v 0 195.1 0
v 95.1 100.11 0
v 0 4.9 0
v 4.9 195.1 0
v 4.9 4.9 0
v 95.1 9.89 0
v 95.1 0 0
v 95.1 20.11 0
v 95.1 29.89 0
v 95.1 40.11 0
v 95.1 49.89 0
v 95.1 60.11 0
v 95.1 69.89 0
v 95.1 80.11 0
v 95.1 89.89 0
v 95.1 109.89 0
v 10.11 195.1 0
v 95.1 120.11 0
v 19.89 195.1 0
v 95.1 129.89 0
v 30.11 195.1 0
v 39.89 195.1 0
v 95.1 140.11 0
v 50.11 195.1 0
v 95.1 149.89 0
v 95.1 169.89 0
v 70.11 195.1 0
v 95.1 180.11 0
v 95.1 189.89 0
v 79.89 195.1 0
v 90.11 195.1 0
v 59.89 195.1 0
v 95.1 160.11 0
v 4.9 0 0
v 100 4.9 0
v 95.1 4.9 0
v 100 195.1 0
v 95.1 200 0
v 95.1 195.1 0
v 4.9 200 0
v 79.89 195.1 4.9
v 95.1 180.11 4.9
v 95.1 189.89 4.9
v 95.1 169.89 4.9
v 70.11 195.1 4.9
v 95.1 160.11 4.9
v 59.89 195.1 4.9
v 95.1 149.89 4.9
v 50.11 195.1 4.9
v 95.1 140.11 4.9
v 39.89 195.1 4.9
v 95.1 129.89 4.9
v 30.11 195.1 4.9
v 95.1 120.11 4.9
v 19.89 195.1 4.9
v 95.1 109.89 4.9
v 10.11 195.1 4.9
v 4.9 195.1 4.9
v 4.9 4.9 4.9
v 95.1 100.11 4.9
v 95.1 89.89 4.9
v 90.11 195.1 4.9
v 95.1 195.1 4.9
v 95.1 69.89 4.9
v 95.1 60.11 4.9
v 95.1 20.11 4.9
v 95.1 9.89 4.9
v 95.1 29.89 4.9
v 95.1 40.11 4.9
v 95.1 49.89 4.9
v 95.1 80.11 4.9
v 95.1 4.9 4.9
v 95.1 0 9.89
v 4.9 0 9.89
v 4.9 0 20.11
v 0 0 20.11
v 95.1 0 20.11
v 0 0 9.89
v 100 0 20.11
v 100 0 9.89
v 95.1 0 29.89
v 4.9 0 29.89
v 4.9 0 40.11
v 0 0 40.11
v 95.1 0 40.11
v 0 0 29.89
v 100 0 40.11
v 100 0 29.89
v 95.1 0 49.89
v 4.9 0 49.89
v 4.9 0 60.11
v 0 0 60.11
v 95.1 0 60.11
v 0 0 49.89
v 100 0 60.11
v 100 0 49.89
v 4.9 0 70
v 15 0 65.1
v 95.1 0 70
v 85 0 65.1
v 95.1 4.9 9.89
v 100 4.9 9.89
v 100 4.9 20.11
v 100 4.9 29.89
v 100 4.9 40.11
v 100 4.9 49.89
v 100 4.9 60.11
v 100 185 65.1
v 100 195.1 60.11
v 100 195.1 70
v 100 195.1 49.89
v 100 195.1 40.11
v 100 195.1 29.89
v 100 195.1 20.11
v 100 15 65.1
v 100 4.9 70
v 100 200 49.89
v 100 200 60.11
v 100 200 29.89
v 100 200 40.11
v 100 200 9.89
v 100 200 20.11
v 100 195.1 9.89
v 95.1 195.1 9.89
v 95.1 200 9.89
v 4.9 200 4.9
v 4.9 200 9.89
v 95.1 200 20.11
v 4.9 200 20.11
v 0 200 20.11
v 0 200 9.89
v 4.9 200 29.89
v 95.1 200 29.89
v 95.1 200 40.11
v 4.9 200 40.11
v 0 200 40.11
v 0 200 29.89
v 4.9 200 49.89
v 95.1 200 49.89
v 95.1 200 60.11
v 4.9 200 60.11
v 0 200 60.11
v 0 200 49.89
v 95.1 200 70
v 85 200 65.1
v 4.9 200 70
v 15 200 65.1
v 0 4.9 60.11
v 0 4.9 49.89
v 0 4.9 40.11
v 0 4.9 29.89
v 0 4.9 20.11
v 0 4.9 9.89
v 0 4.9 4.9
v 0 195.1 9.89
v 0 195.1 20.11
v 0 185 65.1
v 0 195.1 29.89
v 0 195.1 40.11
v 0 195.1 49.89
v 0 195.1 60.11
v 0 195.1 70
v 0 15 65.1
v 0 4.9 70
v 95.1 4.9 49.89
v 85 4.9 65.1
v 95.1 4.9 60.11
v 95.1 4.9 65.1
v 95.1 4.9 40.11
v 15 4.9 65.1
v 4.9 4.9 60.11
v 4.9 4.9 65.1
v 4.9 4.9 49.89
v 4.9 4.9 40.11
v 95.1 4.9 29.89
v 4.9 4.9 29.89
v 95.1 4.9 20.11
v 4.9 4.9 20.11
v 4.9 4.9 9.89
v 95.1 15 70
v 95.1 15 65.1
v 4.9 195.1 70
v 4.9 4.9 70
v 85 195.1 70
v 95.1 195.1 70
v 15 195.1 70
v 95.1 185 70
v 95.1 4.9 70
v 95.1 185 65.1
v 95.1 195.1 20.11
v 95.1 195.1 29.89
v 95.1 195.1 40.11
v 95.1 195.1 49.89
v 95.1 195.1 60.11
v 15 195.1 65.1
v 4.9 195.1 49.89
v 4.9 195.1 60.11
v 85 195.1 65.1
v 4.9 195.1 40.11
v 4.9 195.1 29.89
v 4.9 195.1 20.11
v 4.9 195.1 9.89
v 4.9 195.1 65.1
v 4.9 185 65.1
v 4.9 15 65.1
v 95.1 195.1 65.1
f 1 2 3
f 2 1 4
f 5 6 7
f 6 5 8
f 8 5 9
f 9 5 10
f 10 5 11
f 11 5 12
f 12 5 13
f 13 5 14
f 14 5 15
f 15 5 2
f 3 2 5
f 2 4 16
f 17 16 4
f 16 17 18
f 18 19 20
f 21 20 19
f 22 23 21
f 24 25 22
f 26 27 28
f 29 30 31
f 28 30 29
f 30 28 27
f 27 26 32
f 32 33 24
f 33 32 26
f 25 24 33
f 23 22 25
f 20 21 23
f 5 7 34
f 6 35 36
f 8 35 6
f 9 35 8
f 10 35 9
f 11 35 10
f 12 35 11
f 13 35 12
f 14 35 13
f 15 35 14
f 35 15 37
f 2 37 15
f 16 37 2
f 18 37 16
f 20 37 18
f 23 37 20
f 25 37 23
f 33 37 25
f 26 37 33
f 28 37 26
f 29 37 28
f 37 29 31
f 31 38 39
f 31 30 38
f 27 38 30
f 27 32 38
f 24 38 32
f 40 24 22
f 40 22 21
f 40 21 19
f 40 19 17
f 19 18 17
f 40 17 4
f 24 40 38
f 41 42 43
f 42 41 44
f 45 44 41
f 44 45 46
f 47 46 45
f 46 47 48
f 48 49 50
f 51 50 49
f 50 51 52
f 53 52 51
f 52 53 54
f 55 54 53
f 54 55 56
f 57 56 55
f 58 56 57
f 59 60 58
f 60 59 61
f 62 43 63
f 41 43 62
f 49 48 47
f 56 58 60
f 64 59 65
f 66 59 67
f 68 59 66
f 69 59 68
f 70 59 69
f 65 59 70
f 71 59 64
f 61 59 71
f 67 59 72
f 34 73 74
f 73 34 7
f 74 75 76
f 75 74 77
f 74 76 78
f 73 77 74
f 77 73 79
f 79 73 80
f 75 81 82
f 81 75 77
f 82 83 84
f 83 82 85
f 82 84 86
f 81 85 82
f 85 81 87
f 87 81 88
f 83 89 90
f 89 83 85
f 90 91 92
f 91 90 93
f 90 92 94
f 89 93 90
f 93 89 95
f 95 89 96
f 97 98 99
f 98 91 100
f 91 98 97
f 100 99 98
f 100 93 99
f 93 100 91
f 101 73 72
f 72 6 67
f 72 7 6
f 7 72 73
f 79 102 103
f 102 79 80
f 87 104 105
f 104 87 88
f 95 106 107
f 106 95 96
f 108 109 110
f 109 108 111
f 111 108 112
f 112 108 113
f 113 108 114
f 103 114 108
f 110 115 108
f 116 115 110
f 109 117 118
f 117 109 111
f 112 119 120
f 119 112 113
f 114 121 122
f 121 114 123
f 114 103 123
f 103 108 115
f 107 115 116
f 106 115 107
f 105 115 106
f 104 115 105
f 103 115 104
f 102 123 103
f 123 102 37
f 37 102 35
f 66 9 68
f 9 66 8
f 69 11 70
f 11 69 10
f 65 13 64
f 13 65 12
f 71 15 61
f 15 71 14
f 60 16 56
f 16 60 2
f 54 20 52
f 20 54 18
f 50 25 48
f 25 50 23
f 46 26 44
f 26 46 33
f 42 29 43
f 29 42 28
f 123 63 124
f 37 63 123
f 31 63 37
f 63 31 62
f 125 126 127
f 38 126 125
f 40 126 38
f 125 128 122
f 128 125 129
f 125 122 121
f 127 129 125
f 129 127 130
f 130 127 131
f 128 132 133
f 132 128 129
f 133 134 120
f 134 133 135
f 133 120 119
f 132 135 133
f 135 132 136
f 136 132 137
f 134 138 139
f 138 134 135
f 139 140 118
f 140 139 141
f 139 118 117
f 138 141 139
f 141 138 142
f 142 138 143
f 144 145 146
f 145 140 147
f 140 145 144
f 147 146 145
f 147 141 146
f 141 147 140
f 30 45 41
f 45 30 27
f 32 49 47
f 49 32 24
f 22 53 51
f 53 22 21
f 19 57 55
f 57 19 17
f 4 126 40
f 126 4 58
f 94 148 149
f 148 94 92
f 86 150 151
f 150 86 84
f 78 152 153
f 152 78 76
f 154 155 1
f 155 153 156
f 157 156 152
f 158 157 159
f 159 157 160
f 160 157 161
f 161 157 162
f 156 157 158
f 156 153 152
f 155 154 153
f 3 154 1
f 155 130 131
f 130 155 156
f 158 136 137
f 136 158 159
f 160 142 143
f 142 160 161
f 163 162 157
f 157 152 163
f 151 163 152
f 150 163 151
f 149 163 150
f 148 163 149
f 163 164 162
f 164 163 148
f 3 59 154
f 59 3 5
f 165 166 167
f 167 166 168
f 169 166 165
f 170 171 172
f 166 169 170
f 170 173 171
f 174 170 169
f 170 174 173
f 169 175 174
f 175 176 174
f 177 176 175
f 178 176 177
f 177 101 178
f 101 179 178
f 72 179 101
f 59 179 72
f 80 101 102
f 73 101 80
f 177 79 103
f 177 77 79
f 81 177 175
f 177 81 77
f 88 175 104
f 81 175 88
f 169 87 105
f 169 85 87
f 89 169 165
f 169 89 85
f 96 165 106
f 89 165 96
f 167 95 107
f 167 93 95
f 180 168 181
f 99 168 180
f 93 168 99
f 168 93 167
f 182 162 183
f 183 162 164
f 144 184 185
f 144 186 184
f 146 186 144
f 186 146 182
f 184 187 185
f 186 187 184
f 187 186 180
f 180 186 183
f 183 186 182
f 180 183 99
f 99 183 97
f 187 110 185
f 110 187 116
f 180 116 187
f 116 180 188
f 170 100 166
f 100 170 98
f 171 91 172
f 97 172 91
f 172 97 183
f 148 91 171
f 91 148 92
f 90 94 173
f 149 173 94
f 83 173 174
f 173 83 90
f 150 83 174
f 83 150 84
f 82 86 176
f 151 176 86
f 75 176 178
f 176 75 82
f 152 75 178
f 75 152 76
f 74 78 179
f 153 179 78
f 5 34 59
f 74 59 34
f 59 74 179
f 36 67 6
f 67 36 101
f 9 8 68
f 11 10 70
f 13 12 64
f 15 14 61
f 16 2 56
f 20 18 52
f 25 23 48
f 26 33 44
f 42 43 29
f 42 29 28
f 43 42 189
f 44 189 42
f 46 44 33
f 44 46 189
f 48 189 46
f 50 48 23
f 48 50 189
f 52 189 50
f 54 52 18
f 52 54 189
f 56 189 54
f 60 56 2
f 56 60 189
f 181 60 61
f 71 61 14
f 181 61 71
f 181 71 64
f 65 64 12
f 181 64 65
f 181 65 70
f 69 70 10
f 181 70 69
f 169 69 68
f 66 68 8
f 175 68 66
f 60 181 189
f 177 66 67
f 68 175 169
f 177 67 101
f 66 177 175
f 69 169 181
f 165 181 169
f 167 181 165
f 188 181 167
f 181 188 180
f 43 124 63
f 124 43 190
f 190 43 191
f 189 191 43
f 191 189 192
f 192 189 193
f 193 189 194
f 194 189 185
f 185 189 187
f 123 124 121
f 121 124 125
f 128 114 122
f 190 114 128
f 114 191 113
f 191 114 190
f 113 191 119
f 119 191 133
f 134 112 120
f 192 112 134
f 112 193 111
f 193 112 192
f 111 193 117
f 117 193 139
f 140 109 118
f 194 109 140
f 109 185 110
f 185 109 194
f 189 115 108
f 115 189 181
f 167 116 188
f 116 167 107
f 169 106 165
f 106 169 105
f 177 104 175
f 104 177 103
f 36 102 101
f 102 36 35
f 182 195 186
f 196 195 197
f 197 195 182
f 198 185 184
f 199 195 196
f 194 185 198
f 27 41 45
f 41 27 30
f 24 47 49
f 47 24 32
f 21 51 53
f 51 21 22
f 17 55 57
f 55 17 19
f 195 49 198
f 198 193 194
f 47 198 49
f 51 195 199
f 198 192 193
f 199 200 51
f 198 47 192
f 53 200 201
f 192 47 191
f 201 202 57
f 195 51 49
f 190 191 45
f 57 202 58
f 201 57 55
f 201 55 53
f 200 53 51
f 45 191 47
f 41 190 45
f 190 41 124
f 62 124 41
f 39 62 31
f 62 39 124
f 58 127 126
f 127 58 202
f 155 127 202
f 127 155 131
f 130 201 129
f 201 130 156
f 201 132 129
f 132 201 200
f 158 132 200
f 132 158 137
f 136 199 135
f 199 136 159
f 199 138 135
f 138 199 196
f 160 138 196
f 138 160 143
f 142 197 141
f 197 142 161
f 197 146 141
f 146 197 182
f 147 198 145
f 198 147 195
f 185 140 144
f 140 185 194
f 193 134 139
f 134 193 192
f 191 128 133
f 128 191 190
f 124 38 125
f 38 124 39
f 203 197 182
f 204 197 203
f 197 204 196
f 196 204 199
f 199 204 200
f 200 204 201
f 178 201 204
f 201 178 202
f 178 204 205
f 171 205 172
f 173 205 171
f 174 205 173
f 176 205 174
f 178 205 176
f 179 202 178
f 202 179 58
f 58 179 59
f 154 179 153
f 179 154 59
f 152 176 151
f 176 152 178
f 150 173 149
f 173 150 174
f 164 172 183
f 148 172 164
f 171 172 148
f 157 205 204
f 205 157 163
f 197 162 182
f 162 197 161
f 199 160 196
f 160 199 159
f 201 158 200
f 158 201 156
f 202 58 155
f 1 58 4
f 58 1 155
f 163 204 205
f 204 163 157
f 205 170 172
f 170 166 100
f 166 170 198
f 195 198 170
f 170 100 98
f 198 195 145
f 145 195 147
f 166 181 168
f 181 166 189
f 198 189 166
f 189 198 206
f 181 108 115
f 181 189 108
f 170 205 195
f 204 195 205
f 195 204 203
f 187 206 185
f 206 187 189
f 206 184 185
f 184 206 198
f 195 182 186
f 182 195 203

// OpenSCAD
union() {
	linear_extrude(height = 4.9000000000) {
		union() {
			difference() {
				polygon(points = [[95.1000000000, 189.8900000000], [95.1000000000, 180.1100000000], [100.0000000000, 180.1100000000], [100.0000000000, 169.8900000000], [95.1000000000, 169.8900000000], [95.1000000000, 160.1100000000], [100.0000000000, 160.1100000000], [100.0000000000, 149.8900000000], [95.1000000000, 149.8900000000], [95.1000000000, 140.1100000000], [100.0000000000, 140.1100000000], [100.0000000000, 129.8900000000], [95.1000000000, 129.8900000000], [95.1000000000, 120.1100000000], [100.0000000000, 120.1100000000], [100.0000000000, 109.8900000000], [95.1000000000, 109.8900000000], [95.1000000000, 100.1100000000], [100.0000000000, 100.1100000000], [100.0000000000, 89.8900000000], [95.1000000000, 89.8900000000], [95.1000000000, 80.1100000000], [100.0000000000, 80.1100000000], [100.0000000000, 69.8900000000], [95.1000000000, 69.8900000000], [95.1000000000, 60.1100000000], [100.0000000000, 60.1100000000], [100.0000000000, 49.8900000000], [95.1000000000, 49.8900000000], [95.1000000000, 40.1100000000], [100.0000000000, 40.1100000000], [100.0000000000, 29.8900000000], [95.1000000000, 29.8900000000], [95.1000000000, 20.1100000000], [100.0000000000, 20.1100000000], [100.0000000000, 9.8900000000], [95.1000000000, 9.8900000000], [95.1000000000, 0.0000000000], [89.8900000000, 0.0000000000], [89.8900000000, 4.9000000000], [80.1100000000, 4.9000000000], [80.1100000000, 0.0000000000], [69.8900000000, 0.0000000000], [69.8900000000, 4.9000000000], [60.1100000000, 4.9000000000], [60.1100000000, 0.0000000000], [49.8900000000, 0.0000000000], [49.8900000000, 4.9000000000], [40.1100000000, 4.9000000000], [40.1100000000, 0.0000000000], [29.8900000000, 0.0000000000], [29.8900000000, 4.9000000000], [20.1100000000, 4.9000000000], [20.1100000000, 0.0000000000], [9.8900000000, 0.0000000000], [9.8900000000, 4.9000000000], [0.0000000000, 4.9000000000], [0.0000000000, 10.1100000000], [4.9000000000, 10.1100000000], [4.9000000000, 19.8900000000], [0.0000000000, 19.8900000000], [0.0000000000, 30.1100000000], [4.9000000000, 30.1100000000], [4.9000000000, 39.8900000000], [0.0000000000, 39.8900000000], [0.0000000000, 50.1100000000], [4.9000000000, 50.1100000000], [4.9000000000, 59.8900000000], [0.0000000000, 59.8900000000], [0.0000000000, 70.1100000000], [4.9000000000, 70.1100000000], [4.9000000000, 79.8900000000], [0.0000000000, 79.8900000000], [0.0000000000, 90.1100000000], [4.9000000000, 90.1100000000], [4.9000000000, 99.8900000000], [0.0000000000, 99.8900000000], [0.0000000000, 110.1100000000], [4.9000000000, 110.1100000000], [4.9000000000, 119.8900000000], [0.0000000000, 119.8900000000], [0.0000000000, 130.1100000000], [4.9000000000, 130.1100000000], [4.9000000000, 139.8900000000], [0.0000000000, 139.8900000000], [0.0000000000, 150.1100000000], [4.9000000000, 150.1100000000], [4.9000000000, 159.8900000000], [0.0000000000, 159.8900000000], [0.0000000000, 170.1100000000], [4.9000000000, 170.1100000000], [4.9000000000, 179.8900000000], [0.0000000000, 179.8900000000], [0.0000000000, 190.1100000000], [4.9000000000, 190.1100000000], [4.9000000000, 200.0000000000], [10.1100000000, 200.0000000000], [10.1100000000, 195.1000000000], [19.8900000000, 195.1000000000], [19.8900000000, 200.0000000000], [30.1100000000, 200.0000000000], [30.1100000000, 195.1000000000], [39.8900000000, 195.1000000000], [39.8900000000, 200.0000000000], [50.1100000000, 200.0000000000], [50.1100000000, 195.1000000000], [59.8900000000, 195.1000000000], [59.8900000000, 200.0000000000], [70.1100000000, 200.0000000000], [70.1100000000, 195.1000000000], [79.8900000000, 195.1000000000], [79.8900000000, 200.0000000000], [90.1100000000, 200.0000000000], [90.1100000000, 195.1000000000], [100.0000000000, 195.1000000000], [100.0000000000, 189.8900000000], [95.1000000000, 189.8900000000]]);
			}
		}
	}
	color(alpha = 1.0000000000, c = [0.8000000000, 0.5000000000, 0.2000000000]) {
		translate(v = [0, 4.9000000000, 0]) {
			rotate(a = 90, v = [1, 0, 0]) {
				linear_extrude(height = 4.9000000000) {
					union() {
						difference() {
							polygon(points = [[95.1000000000, 60.1100000000], [100.0000000000, 60.1100000000], [100.0000000000, 49.8900000000], [95.1000000000, 49.8900000000], [95.1000000000, 40.1100000000], [100.0000000000, 40.1100000000], [100.0000000000, 29.8900000000], [95.1000000000, 29.8900000000], [95.1000000000, 20.1100000000], [100.0000000000, 20.1100000000], [100.0000000000, 9.8900000000], [95.1000000000, 9.8900000000], [95.1000000000, 4.9000000000], [90.1100000000, 4.9000000000], [90.1100000000, 0.0000000000], [79.8900000000, 0.0000000000], [79.8900000000, 4.9000000000], [70.1100000000, 4.9000000000], [70.1100000000, 0.0000000000], [59.8900000000, 0.0000000000], [59.8900000000, 4.9000000000], [50.1100000000, 4.9000000000], [50.1100000000, 0.0000000000], [39.8900000000, 0.0000000000], [39.8900000000, 4.9000000000], [30.1100000000, 4.9000000000], [30.1100000000, 0.0000000000], [19.8900000000, 0.0000000000], [19.8900000000, 4.9000000000], [10.1100000000, 4.9000000000], [10.1100000000, 0.0000000000], [4.9000000000, 0.0000000000], [4.9000000000, 9.8900000000], [0.0000000000, 9.8900000000], [0.0000000000, 20.1100000000], [4.9000000000, 20.1100000000], [4.9000000000, 29.8900000000], [0.0000000000, 29.8900000000], [0.0000000000, 40.1100000000], [4.9000000000, 40.1100000000], [4.9000000000, 49.8900000000], [0.0000000000, 49.8900000000], [0.0000000000, 60.1100000000], [4.9000000000, 60.1100000000], [4.9000000000, 70.0000000000], [15.0000000000, 70.0000000000], [15.0000000000, 65.1000000000], [85.0000000000, 65.1000000000], [85.0000000000, 70.0000000000], [95.1000000000, 70.0000000000], [95.1000000000, 60.1100000000]]);
						}
					}
				}
			}
		}
	}
	color(alpha = 1.0000000000, c = [0.7000000000, 0.4000000000, 0.1000000000]) {
		translate(v = [95.1000000000, 0, 0]) {
			rotate(a = 90, v = [0, 0, 1]) {
				rotate(a = 90, v = [1, 0, 0]) {
					linear_extrude(height = 4.9000000000) {
						union() {
							difference() {
								polygon(points = [[195.1000000000, 60.1100000000], [200.0000000000, 60.1100000000], [200.0000000000, 49.8900000000], [195.1000000000, 49.8900000000], [195.1000000000, 40.1100000000], [200.0000000000, 40.1100000000], [200.0000000000, 29.8900000000], [195.1000000000, 29.8900000000], [195.1000000000, 20.1100000000], [200.0000000000, 20.1100000000], [200.0000000000, 9.8900000000], [195.1000000000, 9.8900000000], [195.1000000000, 4.9000000000], [190.1100000000, 4.9000000000], [190.1100000000, 0.0000000000], [179.8900000000, 0.0000000000], [179.8900000000, 4.9000000000], [170.1100000000, 4.9000000000], [170.1100000000, 0.0000000000], [159.8900000000, 0.0000000000], [159.8900000000, 4.9000000000], [150.1100000000, 4.9000000000], [150.1100000000, 0.0000000000], [139.8900000000, 0.0000000000], [139.8900000000, 4.9000000000], [130.1100000000, 4.9000000000], [130.1100000000, 0.0000000000], [119.8900000000, 0.0000000000], [119.8900000000, 4.9000000000], [110.1100000000, 4.9000000000], [110.1100000000, 0.0000000000], [99.8900000000, 0.0000000000], [99.8900000000, 4.9000000000], [90.1100000000, 4.9000000000], [90.1100000000, 0.0000000000], [79.8900000000, 0.0000000000], [79.8900000000, 4.9000000000], [70.1100000000, 4.9000000000], [70.1100000000, 0.0000000000], [59.8900000000, 0.0000000000], [59.8900000000, 4.9000000000], [50.1100000000, 4.9000000000], [50.1100000000, 0.0000000000], [39.8900000000, 0.0000000000], [39.8900000000, 4.9000000000], [30.1100000000, 4.9000000000], [30.1100000000, 0.0000000000], [19.8900000000, 0.0000000000], [19.8900000000, 4.9000000000], [10.1100000000, 4.9000000000], [10.1100000000, 0.0000000000], [4.9000000000, 0.0000000000], [4.9000000000, 9.8900000000], [0.0000000000, 9.8900000000], [0.0000000000, 20.1100000000], [4.9000000000, 20.1100000000], [4.9000000000, 29.8900000000], [0.0000000000, 29.8900000000], [0.0000000000, 40.1100000000], [4.9000000000, 40.1100000000], [4.9000000000, 49.8900000000], [0.0000000000, 49.8900000000], [0.0000000000, 60.1100000000], [4.9000000000, 60.1100000000], [4.9000000000, 70.0000000000], [15.0000000000, 70.0000000000], [15.0000000000, 65.1000000000], [185.0000000000, 65.1000000000], [185.0000000000, 70.0000000000], [195.1000000000, 70.0000000000], [195.1000000000, 60.1100000000]]);
							}
						}
					}
				}
			}
		}
	}
	color(alpha = 1.0000000000, c = [0.8000000000, 0.5000000000, 0.2000000000]) {
		translate(v = [100, 195.1000000000, 0]) {
			rotate(a = 180, v = [0, 0, 1]) {
				rotate(a = 90, v = [1, 0, 0]) {
					linear_extrude(height = 4.9000000000) {
						union() {
							difference() {
								polygon(points = [[95.1000000000, 60.1100000000], [100.0000000000, 60.1100000000], [100.0000000000, 49.8900000000], [95.1000000000, 49.8900000000], [95.1000000000, 40.1100000000], [100.0000000000, 40.1100000000], [100.0000000000, 29.8900000000], [95.1000000000, 29.8900000000], [95.1000000000, 20.1100000000], [100.0000000000, 20.1100000000], [100.0000000000, 9.8900000000], [95.1000000000, 9.8900000000], [95.1000000000, 4.9000000000], [90.1100000000, 4.9000000000], [90.1100000000, 0.0000000000], [79.8900000000, 0.0000000000], [79.8900000000, 4.9000000000], [70.1100000000, 4.9000000000], [70.1100000000, 0.0000000000], [59.8900000000, 0.0000000000], [59.8900000000, 4.9000000000], [50.1100000000, 4.9000000000], [50.1100000000, 0.0000000000], [39.8900000000, 0.0000000000], [39.8900000000, 4.9000000000], [30.1100000000, 4.9000000000], [30.1100000000, 0.0000000000], [19.8900000000, 0.0000000000], [19.8900000000, 4.9000000000], [10.1100000000, 4.9000000000], [10.1100000000, 0.0000000000], [4.9000000000, 0.0000000000], [4.9000000000, 9.8900000000], [0.0000000000, 9.8900000000], [0.0000000000, 20.1100000000], [4.9000000000, 20.1100000000], [4.9000000000, 29.8900000000], [0.0000000000, 29.8900000000], [0.0000000000, 40.1100000000], [4.9000000000, 40.1100000000], [4.9000000000, 49.8900000000], [0.0000000000, 49.8900000000], [0.0000000000, 60.1100000000], [4.9000000000, 60.1100000000], [4.9000000000, 70.0000000000], [15.0000000000, 70.0000000000], [15.0000000000, 65.1000000000], [85.0000000000, 65.1000000000], [85.0000000000, 70.0000000000], [95.1000000000, 70.0000000000], [95.1000000000, 60.1100000000]]);
							}
						}
					}
				}
			}
		}
	}
	color(alpha = 1.0000000000, c = [0.7000000000, 0.4000000000, 0.1000000000]) {
		translate(v = [4.9000000000, 200, 0]) {
			rotate(a = 270, v = [0, 0, 1]) {
				rotate(a = 90, v = [1, 0, 0]) {
					linear_extrude(height = 4.9000000000) {
						union() {
							difference() {
								polygon(points = [[195.1000000000, 60.1100000000], [200.0000000000, 60.1100000000], [200.0000000000, 49.8900000000], [195.1000000000, 49.8900000000], [195.1000000000, 40.1100000000], [200.0000000000, 40.1100000000], [200.0000000000, 29.8900000000], [195.1000000000, 29.8900000000], [195.1000000000, 20.1100000000], [200.0000000000, 20.1100000000], [200.0000000000, 9.8900000000], [195.1000000000, 9.8900000000], [195.1000000000, 4.9000000000], [190.1100000000, 4.9000000000], [190.1100000000, 0.0000000000], [179.8900000000, 0.0000000000], [179.8900000000, 4.9000000000], [170.1100000000, 4.9000000000], [170.1100000000, 0.0000000000], [159.8900000000, 0.0000000000], [159.8900000000, 4.9000000000], [150.1100000000, 4.9000000000], [150.1100000000, 0.0000000000], [139.8900000000, 0.0000000000], [139.8900000000, 4.9000000000], [130.1100000000, 4.9000000000], [130.1100000000, 0.0000000000], [119.8900000000, 0.0000000000], [119.8900000000, 4.9000000000], [110.1100000000, 4.9000000000], [110.1100000000, 0.0000000000], [99.8900000000, 0.0000000000], [99.8900000000, 4.9000000000], [90.1100000000, 4.9000000000], [90.1100000000, 0.0000000000], [79.8900000000, 0.0000000000], [79.8900000000, 4.9000000000], [70.1100000000, 4.9000000000], [70.1100000000, 0.0000000000], [59.8900000000, 0.0000000000], [59.8900000000, 4.9000000000], [50.1100000000, 4.9000000000], [50.1100000000, 0.0000000000], [39.8900000000, 0.0000000000], [39.8900000000, 4.9000000000], [30.1100000000, 4.9000000000], [30.1100000000, 0.0000000000], [19.8900000000, 0.0000000000], [19.8900000000, 4.9000000000], [10.1100000000, 4.9000000000], [10.1100000000, 0.0000000000], [4.9000000000, 0.0000000000], [4.9000000000, 9.8900000000], [0.0000000000, 9.8900000000], [0.0000000000, 20.1100000000], [4.9000000000, 20.1100000000], [4.9000000000, 29.8900000000], [0.0000000000, 29.8900000000], [0.0000000000, 40.1100000000], [4.9000000000, 40.1100000000], [4.9000000000, 49.8900000000], [0.0000000000, 49.8900000000], [0.0000000000, 60.1100000000], [4.9000000000, 60.1100000000], [4.9000000000, 70.0000000000], [15.0000000000, 70.0000000000], [15.0000000000, 65.1000000000], [185.0000000000, 65.1000000000], [185.0000000000, 70.0000000000], [195.1000000000, 70.0000000000], [195.1000000000, 60.1100000000]]);
							}
						}
					}
				}
			}
		}
	}
	translate(v = [0, 0, 65.1000000000]) {
		linear_extrude(height = 4.9000000000) {
			union() {
				difference() {
					polygon(points = [[95.1000000000, 4.9000000000], [85.0000000000, 4.9000000000], [85.0000000000, 0.0000000000], [15.0000000000, 0.0000000000], [15.0000000000, 4.9000000000], [4.9000000000, 4.9000000000], [4.9000000000, 15.0000000000], [0.0000000000, 15.0000000000], [0.0000000000, 185.0000000000], [4.9000000000, 185.0000000000], [4.9000000000, 195.1000000000], [15.0000000000, 195.1000000000], [15.0000000000, 200.0000000000], [85.0000000000, 200.0000000000], [85.0000000000, 195.1000000000], [95.1000000000, 195.1000000000], [95.1000000000, 185.0000000000], [100.0000000000, 185.0000000000], [100.0000000000, 15.0000000000], [95.1000000000, 15.0000000000], [95.1000000000, 4.9000000000]]);
				}
			}
		}
	}
}
